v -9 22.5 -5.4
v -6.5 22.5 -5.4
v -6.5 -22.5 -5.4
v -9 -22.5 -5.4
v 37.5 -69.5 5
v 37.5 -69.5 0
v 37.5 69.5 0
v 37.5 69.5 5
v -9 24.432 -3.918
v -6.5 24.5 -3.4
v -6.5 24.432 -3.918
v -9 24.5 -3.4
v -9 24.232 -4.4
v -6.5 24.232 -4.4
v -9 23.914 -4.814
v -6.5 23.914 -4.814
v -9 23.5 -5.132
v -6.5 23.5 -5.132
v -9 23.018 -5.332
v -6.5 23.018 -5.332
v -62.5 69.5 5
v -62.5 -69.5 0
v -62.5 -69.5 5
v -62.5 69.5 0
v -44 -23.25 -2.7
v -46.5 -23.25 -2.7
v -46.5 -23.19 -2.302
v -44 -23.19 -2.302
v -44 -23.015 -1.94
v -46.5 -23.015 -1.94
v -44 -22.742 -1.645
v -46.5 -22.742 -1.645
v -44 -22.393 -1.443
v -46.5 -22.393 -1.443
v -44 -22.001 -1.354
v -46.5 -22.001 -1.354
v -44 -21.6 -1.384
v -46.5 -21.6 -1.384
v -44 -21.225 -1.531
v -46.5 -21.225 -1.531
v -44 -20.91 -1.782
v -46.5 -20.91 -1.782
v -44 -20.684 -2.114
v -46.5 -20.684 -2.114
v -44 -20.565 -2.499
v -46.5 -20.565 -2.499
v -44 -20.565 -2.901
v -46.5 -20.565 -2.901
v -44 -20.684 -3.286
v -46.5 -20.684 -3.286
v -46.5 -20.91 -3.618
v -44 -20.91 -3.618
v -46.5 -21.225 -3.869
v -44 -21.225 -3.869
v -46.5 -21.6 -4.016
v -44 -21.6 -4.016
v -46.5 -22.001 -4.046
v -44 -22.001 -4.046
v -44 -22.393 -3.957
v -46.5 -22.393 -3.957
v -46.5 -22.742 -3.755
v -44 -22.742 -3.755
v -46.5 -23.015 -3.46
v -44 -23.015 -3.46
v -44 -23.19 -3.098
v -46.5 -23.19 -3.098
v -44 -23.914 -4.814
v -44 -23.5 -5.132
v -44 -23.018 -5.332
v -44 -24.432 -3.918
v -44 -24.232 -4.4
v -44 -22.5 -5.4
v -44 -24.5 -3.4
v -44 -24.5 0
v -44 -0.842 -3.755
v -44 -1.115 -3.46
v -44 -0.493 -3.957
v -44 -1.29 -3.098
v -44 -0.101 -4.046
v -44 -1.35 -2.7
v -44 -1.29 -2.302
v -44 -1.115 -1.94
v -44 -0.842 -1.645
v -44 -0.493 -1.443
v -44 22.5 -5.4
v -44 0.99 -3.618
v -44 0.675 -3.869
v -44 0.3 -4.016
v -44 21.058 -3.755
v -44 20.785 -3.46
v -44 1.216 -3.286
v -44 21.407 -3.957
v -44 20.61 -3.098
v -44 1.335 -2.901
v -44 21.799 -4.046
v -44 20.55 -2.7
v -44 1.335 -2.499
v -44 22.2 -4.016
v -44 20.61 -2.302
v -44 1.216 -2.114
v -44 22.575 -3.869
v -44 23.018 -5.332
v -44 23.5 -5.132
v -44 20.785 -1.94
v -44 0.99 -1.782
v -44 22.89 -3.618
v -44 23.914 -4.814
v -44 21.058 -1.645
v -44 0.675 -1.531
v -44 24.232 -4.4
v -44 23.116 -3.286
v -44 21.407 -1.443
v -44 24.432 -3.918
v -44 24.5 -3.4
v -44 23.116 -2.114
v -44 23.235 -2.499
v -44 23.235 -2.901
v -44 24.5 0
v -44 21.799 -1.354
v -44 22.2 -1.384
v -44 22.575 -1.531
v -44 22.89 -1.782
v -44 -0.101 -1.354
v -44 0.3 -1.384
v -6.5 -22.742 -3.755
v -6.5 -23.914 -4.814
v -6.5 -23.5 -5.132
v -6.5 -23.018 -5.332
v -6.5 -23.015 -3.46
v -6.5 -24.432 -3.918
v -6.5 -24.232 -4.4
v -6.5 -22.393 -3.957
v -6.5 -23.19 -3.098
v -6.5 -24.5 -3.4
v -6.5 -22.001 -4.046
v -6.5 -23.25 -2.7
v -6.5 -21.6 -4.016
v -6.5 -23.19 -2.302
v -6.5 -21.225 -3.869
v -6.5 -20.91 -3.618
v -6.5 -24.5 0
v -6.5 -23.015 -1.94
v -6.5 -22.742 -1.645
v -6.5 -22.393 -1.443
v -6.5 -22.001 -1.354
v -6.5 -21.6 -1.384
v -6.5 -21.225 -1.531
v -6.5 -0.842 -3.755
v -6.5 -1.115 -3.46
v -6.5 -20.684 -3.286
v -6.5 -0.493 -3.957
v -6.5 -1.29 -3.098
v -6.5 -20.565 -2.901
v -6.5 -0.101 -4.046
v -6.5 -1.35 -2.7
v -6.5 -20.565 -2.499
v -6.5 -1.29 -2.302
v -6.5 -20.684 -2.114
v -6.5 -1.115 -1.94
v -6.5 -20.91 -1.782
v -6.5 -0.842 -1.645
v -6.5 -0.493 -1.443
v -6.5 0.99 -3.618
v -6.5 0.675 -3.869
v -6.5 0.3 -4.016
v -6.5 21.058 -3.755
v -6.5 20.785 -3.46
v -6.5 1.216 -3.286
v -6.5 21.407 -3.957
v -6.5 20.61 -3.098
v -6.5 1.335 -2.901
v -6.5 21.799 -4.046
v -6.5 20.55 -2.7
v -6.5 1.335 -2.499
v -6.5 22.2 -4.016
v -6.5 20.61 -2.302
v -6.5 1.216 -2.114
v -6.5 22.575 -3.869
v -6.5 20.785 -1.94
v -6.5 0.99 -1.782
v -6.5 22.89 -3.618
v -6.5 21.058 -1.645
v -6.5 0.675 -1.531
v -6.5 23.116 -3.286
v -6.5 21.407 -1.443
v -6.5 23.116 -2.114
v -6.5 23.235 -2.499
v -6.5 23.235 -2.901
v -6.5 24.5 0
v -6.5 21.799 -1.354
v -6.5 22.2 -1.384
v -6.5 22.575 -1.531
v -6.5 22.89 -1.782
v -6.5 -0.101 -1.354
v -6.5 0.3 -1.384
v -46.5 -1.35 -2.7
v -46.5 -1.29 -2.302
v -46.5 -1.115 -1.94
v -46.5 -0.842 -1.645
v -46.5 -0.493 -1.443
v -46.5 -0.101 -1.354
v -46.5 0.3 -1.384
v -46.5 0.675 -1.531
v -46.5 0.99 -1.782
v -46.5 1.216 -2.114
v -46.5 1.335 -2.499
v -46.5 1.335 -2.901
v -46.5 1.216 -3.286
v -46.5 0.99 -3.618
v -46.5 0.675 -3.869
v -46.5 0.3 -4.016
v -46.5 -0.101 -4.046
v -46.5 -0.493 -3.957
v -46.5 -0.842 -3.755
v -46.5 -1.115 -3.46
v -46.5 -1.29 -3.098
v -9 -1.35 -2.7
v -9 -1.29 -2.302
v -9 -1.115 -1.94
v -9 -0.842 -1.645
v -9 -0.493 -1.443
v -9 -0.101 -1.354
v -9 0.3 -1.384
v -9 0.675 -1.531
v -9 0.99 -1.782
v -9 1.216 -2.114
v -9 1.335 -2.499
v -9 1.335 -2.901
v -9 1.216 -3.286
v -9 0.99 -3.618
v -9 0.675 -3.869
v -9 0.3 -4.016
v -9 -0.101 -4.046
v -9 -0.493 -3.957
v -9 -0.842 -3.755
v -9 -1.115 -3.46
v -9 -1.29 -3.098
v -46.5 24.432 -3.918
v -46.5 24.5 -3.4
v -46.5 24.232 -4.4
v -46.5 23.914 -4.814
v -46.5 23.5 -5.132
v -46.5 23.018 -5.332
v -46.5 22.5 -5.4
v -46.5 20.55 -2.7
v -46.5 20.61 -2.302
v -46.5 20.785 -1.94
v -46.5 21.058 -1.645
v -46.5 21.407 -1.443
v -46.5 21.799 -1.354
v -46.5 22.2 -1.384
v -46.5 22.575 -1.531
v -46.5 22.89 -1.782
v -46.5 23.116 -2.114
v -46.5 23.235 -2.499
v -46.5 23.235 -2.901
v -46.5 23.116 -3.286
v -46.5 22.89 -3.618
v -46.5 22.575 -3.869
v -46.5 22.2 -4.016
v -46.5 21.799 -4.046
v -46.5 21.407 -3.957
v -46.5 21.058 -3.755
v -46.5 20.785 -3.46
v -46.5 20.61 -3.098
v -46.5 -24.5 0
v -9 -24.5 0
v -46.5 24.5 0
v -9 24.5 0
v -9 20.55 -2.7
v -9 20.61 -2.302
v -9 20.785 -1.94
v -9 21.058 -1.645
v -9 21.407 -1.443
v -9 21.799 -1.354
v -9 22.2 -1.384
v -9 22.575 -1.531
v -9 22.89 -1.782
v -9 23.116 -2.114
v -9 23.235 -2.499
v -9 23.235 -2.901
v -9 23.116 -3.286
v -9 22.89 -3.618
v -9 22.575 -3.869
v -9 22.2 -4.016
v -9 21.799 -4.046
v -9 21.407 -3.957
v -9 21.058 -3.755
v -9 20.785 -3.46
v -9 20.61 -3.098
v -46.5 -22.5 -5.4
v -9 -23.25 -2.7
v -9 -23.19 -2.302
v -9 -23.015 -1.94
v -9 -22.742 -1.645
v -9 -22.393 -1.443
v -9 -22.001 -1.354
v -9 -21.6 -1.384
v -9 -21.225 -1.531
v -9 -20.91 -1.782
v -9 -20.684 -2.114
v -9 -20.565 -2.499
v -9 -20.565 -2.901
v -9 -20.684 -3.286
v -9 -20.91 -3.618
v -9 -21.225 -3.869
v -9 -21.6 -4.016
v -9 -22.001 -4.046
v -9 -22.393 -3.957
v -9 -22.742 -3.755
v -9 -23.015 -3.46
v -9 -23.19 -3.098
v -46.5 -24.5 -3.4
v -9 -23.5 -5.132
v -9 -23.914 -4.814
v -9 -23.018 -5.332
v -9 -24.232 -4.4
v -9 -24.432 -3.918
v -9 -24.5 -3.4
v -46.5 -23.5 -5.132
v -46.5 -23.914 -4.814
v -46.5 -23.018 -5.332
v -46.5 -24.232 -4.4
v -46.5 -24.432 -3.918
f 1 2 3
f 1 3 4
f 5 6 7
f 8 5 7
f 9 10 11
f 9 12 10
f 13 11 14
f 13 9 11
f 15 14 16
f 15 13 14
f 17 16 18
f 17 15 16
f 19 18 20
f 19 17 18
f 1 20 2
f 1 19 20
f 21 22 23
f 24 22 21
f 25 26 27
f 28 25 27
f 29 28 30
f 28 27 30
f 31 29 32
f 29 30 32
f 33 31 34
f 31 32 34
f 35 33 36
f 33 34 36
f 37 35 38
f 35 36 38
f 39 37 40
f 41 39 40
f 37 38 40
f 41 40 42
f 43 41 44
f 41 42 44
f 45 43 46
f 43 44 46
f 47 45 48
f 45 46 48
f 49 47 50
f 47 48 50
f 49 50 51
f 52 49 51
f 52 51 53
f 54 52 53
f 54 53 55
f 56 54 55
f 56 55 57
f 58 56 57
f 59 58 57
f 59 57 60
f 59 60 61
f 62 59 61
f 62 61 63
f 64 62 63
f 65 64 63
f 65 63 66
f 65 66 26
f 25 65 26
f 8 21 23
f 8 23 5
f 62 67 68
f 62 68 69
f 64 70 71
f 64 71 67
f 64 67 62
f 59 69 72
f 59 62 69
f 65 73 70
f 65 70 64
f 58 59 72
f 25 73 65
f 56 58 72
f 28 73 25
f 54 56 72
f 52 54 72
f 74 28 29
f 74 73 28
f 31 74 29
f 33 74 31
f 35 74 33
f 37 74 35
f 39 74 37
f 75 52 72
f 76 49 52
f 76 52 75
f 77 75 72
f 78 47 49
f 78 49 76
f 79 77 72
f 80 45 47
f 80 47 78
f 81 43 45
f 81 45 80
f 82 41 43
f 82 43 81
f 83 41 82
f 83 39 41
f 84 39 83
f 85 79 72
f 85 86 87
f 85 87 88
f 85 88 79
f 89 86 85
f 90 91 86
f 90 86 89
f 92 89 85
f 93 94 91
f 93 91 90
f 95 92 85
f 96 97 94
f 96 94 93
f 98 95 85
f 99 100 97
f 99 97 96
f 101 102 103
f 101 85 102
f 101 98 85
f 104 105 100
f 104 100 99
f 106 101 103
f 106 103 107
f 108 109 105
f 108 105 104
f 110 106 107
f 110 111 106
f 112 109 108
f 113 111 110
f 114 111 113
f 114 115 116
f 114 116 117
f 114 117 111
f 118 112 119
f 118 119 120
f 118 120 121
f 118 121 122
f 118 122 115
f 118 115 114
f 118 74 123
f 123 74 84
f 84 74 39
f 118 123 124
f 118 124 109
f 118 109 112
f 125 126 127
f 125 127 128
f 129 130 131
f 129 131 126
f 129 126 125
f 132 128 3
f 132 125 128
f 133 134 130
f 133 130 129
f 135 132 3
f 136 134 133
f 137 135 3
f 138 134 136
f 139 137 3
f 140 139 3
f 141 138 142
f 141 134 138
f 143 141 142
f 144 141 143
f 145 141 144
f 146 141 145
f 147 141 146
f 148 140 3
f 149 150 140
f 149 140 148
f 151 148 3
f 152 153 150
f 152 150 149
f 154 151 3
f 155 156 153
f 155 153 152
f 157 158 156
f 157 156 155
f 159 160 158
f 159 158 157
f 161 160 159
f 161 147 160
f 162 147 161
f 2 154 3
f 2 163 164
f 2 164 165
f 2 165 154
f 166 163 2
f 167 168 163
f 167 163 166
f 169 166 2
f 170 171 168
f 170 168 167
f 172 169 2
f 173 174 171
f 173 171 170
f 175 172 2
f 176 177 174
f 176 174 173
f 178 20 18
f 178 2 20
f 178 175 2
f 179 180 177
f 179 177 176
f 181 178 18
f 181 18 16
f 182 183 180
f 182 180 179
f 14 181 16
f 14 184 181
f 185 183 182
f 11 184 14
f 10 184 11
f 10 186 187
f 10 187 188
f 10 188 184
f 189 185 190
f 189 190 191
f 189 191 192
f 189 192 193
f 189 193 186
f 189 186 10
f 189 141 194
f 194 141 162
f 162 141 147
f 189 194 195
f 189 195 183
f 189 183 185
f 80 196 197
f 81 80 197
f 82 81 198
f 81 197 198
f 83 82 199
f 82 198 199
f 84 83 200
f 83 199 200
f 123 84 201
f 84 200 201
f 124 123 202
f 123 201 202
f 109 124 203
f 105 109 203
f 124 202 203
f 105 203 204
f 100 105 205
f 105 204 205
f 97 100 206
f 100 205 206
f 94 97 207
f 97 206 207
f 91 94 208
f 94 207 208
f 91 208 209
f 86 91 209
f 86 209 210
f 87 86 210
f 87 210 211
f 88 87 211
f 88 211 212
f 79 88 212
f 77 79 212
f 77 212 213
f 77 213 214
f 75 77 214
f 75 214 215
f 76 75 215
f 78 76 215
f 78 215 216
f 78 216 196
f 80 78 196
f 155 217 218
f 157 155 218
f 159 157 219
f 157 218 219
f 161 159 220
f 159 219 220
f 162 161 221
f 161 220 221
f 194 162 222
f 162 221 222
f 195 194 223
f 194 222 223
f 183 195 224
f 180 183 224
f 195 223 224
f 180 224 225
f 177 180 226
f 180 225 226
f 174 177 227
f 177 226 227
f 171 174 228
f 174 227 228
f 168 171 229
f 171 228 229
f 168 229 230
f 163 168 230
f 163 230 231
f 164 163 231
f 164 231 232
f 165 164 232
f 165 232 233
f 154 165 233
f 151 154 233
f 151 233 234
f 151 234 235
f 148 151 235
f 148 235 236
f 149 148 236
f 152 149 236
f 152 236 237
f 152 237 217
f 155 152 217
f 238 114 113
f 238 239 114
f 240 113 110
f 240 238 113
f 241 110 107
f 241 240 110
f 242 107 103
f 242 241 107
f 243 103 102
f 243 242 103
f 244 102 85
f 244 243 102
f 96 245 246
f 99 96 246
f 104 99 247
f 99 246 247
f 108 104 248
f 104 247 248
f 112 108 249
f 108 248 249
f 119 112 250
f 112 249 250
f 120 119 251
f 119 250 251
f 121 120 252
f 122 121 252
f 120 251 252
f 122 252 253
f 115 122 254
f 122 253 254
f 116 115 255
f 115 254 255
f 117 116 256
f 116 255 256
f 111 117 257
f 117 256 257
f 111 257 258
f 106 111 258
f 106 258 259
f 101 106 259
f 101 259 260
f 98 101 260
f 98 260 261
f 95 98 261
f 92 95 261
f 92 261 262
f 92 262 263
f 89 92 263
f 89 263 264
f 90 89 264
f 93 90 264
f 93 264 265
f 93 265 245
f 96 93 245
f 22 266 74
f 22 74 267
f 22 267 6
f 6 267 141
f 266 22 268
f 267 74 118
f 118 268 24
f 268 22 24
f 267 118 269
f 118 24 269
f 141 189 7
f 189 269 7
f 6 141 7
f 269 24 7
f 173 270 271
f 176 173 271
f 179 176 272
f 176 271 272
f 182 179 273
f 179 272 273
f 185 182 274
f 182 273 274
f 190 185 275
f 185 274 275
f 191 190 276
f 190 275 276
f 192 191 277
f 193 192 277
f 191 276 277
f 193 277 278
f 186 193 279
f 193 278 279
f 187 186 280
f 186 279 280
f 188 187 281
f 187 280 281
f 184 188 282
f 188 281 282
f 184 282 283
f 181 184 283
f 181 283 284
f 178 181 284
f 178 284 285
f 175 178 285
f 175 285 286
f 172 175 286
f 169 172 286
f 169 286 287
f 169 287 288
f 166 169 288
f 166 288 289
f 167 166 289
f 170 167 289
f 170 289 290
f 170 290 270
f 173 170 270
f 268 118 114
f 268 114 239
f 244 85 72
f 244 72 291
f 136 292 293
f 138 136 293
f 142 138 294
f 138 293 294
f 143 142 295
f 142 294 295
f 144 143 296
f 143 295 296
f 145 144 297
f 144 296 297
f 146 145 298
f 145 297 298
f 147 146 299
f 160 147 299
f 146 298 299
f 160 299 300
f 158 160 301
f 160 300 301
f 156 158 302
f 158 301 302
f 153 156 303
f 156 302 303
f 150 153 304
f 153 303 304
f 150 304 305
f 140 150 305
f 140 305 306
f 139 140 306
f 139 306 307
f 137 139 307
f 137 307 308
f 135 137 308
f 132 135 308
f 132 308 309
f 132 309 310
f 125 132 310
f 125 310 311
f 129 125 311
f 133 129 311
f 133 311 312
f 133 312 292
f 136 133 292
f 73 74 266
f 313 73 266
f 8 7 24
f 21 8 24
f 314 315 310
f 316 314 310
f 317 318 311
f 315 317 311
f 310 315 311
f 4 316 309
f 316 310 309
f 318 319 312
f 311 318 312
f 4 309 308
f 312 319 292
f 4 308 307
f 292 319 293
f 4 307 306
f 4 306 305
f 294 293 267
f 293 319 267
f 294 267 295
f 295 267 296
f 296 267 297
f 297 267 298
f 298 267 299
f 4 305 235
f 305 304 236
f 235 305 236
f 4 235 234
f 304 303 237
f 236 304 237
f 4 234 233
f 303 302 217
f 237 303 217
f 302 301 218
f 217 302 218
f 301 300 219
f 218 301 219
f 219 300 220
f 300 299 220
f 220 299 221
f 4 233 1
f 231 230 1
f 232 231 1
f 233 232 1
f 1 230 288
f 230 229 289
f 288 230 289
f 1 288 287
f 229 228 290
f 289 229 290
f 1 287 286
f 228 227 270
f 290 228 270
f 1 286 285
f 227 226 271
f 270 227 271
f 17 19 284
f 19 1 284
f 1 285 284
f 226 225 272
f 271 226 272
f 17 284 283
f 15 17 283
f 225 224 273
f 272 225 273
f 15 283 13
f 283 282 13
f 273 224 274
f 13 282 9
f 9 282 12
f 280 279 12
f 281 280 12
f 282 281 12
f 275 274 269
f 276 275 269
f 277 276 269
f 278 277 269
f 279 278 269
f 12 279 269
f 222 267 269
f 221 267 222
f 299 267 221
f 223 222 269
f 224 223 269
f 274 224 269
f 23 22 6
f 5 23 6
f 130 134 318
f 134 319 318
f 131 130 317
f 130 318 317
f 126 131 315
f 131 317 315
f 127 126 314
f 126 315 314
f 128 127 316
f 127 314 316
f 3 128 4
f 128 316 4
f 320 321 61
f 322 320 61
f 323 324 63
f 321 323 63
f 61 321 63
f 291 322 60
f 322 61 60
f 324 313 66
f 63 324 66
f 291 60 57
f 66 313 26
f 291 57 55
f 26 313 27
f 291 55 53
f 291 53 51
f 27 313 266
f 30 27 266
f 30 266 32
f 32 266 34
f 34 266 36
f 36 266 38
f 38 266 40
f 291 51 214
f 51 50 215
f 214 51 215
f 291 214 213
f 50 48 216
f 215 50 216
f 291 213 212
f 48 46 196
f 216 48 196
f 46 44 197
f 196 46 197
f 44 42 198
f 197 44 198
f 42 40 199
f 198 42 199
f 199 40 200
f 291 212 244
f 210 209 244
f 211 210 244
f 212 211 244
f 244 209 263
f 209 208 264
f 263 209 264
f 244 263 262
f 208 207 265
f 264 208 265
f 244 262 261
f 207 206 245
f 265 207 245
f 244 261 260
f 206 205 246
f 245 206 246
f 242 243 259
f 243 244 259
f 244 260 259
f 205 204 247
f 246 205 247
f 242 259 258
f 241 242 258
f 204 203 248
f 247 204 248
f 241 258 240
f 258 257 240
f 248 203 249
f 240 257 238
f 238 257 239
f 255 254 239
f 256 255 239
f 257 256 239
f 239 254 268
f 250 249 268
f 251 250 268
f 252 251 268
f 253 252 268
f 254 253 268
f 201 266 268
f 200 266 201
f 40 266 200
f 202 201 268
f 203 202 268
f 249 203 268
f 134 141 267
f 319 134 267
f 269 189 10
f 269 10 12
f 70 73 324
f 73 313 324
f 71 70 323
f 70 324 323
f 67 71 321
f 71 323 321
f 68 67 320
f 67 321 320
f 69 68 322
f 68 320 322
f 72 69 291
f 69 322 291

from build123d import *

# Parameters (mm, degrees)
ESBO_O1_W                = 125
ESBO_O1_H                = 175
RESSALTO_EXTRUS_O1_DEPTH = 5
ESBO_O2_W                = 2.5
ESBO_O2_H                = 49
RESSALTO_EXTRUS_O2_DEPTH = 5.4
FILETE1_R                = 2
ESBO_O3_R                = 1.35
CORTE_EXTRUS_O2_DEPTH    = 140.879984272
CORTE_EXTRUS_O3_DEPTH    = 108.664571703


with BuildPart() as part:
    # Esboço1 → Ressalto-extrusão1 (new body)
    with BuildSketch(Plane.XY):
        Rectangle(ESBO_O1_W, ESBO_O1_H)
    extrude(amount=RESSALTO_EXTRUS_O1_DEPTH)

    # Esboço2 → Ressalto-extrusão2 (add)
    with BuildSketch(Plane(origin=(0, 0, 0), x_dir=(-1, 0, 0), z_dir=(0, 0, -1))):
        with Locations((7.75, 0)):
            Rectangle(ESBO_O2_W, ESBO_O2_H)
        with Locations((45.25, 0)):
            Rectangle(ESBO_O2_W, ESBO_O2_H)
    extrude(amount=RESSALTO_EXTRUS_O2_DEPTH)

    # Filete1
    filete1_edges = [part.edges().sort_by_distance(p)[0] for p in [
        (-7.75, 24.5, -5.4),
        (-7.75, -24.5, -5.4),
        (-45.25, 24.5, -5.4),
        (-45.25, -24.5, -5.4),
    ]]
    fillet(filete1_edges, radius=FILETE1_R)

    # Esboço3 → Corte-extrusão2 (cut, through all)
    with BuildSketch(Plane.ZY.offset(46.5)):
        with Locations(Location((-2.7, -21.9, 0), (0, 0, 270))):
            Circle(ESBO_O3_R)
        with Locations(Location((-2.7, 21.9, 0), (0, 0, 270))):
            Circle(ESBO_O3_R)
        with Locations(Location((-2.7, 0, 0), (0, 0, 270))):
            Circle(ESBO_O3_R)
    extrude(amount=-CORTE_EXTRUS_O2_DEPTH, mode=Mode.SUBTRACT)

    # Esboço4 → Corte-extrusão3 (cut, through all)
    with BuildSketch(Plane(origin=(0, 0, 0), x_dir=(-1, 0, 0), z_dir=(0, 0, -1))):
        Polygon((62.5, -87.5), (62.5, -69.5), (-37.5, -69.5), (-37.5, 69.5), (62.5, 69.5), (62.5, 87.5), (-62.5, 87.5), (-62.5, -87.5), align=None)
    extrude(amount=-CORTE_EXTRUS_O3_DEPTH, mode=Mode.SUBTRACT)


solid = part.part
